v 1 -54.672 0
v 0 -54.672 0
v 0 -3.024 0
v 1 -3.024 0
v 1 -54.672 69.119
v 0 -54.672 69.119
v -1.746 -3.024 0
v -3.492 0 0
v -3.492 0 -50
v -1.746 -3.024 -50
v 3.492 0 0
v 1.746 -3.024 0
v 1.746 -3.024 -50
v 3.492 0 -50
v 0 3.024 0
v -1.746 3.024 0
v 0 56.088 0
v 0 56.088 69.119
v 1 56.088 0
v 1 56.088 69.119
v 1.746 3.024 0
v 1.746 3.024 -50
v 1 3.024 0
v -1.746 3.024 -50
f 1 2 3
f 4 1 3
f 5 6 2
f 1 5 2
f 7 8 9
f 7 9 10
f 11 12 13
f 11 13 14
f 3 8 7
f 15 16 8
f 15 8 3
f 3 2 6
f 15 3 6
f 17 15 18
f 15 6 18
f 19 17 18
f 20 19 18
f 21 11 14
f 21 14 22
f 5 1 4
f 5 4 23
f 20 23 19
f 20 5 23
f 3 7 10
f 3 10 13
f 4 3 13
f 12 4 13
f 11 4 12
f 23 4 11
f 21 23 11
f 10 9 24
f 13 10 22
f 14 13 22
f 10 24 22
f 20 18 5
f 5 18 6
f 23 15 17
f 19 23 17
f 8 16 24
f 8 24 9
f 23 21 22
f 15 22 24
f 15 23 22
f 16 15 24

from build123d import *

# Parameters (mm, degrees)
F2_DEPTH = 50
F3_DEPTH = 1


with BuildPart() as f2:
    # F1 (on Top) → F2 (new body)
    with BuildSketch(Plane.XY):
        Polygon((1.74609, 3.024317), (-1.74609, 3.024317), (-3.492181, 0), (-1.74609, -3.024317), (1.74609, -3.024317), (3.492181, 0), align=None)
    extrude(amount=-F2_DEPTH)

    # F0 (on Right) → F3 (join)
    with BuildSketch(Plane.YZ):
        Polygon((-54.671764, 69.118708), (-54.671764, 0), (-8.214929, 0), (6.51529, 0), (56.088127, 0), (56.088127, 69.118708), align=None)
    extrude(amount=F3_DEPTH)


solid = f2.part
